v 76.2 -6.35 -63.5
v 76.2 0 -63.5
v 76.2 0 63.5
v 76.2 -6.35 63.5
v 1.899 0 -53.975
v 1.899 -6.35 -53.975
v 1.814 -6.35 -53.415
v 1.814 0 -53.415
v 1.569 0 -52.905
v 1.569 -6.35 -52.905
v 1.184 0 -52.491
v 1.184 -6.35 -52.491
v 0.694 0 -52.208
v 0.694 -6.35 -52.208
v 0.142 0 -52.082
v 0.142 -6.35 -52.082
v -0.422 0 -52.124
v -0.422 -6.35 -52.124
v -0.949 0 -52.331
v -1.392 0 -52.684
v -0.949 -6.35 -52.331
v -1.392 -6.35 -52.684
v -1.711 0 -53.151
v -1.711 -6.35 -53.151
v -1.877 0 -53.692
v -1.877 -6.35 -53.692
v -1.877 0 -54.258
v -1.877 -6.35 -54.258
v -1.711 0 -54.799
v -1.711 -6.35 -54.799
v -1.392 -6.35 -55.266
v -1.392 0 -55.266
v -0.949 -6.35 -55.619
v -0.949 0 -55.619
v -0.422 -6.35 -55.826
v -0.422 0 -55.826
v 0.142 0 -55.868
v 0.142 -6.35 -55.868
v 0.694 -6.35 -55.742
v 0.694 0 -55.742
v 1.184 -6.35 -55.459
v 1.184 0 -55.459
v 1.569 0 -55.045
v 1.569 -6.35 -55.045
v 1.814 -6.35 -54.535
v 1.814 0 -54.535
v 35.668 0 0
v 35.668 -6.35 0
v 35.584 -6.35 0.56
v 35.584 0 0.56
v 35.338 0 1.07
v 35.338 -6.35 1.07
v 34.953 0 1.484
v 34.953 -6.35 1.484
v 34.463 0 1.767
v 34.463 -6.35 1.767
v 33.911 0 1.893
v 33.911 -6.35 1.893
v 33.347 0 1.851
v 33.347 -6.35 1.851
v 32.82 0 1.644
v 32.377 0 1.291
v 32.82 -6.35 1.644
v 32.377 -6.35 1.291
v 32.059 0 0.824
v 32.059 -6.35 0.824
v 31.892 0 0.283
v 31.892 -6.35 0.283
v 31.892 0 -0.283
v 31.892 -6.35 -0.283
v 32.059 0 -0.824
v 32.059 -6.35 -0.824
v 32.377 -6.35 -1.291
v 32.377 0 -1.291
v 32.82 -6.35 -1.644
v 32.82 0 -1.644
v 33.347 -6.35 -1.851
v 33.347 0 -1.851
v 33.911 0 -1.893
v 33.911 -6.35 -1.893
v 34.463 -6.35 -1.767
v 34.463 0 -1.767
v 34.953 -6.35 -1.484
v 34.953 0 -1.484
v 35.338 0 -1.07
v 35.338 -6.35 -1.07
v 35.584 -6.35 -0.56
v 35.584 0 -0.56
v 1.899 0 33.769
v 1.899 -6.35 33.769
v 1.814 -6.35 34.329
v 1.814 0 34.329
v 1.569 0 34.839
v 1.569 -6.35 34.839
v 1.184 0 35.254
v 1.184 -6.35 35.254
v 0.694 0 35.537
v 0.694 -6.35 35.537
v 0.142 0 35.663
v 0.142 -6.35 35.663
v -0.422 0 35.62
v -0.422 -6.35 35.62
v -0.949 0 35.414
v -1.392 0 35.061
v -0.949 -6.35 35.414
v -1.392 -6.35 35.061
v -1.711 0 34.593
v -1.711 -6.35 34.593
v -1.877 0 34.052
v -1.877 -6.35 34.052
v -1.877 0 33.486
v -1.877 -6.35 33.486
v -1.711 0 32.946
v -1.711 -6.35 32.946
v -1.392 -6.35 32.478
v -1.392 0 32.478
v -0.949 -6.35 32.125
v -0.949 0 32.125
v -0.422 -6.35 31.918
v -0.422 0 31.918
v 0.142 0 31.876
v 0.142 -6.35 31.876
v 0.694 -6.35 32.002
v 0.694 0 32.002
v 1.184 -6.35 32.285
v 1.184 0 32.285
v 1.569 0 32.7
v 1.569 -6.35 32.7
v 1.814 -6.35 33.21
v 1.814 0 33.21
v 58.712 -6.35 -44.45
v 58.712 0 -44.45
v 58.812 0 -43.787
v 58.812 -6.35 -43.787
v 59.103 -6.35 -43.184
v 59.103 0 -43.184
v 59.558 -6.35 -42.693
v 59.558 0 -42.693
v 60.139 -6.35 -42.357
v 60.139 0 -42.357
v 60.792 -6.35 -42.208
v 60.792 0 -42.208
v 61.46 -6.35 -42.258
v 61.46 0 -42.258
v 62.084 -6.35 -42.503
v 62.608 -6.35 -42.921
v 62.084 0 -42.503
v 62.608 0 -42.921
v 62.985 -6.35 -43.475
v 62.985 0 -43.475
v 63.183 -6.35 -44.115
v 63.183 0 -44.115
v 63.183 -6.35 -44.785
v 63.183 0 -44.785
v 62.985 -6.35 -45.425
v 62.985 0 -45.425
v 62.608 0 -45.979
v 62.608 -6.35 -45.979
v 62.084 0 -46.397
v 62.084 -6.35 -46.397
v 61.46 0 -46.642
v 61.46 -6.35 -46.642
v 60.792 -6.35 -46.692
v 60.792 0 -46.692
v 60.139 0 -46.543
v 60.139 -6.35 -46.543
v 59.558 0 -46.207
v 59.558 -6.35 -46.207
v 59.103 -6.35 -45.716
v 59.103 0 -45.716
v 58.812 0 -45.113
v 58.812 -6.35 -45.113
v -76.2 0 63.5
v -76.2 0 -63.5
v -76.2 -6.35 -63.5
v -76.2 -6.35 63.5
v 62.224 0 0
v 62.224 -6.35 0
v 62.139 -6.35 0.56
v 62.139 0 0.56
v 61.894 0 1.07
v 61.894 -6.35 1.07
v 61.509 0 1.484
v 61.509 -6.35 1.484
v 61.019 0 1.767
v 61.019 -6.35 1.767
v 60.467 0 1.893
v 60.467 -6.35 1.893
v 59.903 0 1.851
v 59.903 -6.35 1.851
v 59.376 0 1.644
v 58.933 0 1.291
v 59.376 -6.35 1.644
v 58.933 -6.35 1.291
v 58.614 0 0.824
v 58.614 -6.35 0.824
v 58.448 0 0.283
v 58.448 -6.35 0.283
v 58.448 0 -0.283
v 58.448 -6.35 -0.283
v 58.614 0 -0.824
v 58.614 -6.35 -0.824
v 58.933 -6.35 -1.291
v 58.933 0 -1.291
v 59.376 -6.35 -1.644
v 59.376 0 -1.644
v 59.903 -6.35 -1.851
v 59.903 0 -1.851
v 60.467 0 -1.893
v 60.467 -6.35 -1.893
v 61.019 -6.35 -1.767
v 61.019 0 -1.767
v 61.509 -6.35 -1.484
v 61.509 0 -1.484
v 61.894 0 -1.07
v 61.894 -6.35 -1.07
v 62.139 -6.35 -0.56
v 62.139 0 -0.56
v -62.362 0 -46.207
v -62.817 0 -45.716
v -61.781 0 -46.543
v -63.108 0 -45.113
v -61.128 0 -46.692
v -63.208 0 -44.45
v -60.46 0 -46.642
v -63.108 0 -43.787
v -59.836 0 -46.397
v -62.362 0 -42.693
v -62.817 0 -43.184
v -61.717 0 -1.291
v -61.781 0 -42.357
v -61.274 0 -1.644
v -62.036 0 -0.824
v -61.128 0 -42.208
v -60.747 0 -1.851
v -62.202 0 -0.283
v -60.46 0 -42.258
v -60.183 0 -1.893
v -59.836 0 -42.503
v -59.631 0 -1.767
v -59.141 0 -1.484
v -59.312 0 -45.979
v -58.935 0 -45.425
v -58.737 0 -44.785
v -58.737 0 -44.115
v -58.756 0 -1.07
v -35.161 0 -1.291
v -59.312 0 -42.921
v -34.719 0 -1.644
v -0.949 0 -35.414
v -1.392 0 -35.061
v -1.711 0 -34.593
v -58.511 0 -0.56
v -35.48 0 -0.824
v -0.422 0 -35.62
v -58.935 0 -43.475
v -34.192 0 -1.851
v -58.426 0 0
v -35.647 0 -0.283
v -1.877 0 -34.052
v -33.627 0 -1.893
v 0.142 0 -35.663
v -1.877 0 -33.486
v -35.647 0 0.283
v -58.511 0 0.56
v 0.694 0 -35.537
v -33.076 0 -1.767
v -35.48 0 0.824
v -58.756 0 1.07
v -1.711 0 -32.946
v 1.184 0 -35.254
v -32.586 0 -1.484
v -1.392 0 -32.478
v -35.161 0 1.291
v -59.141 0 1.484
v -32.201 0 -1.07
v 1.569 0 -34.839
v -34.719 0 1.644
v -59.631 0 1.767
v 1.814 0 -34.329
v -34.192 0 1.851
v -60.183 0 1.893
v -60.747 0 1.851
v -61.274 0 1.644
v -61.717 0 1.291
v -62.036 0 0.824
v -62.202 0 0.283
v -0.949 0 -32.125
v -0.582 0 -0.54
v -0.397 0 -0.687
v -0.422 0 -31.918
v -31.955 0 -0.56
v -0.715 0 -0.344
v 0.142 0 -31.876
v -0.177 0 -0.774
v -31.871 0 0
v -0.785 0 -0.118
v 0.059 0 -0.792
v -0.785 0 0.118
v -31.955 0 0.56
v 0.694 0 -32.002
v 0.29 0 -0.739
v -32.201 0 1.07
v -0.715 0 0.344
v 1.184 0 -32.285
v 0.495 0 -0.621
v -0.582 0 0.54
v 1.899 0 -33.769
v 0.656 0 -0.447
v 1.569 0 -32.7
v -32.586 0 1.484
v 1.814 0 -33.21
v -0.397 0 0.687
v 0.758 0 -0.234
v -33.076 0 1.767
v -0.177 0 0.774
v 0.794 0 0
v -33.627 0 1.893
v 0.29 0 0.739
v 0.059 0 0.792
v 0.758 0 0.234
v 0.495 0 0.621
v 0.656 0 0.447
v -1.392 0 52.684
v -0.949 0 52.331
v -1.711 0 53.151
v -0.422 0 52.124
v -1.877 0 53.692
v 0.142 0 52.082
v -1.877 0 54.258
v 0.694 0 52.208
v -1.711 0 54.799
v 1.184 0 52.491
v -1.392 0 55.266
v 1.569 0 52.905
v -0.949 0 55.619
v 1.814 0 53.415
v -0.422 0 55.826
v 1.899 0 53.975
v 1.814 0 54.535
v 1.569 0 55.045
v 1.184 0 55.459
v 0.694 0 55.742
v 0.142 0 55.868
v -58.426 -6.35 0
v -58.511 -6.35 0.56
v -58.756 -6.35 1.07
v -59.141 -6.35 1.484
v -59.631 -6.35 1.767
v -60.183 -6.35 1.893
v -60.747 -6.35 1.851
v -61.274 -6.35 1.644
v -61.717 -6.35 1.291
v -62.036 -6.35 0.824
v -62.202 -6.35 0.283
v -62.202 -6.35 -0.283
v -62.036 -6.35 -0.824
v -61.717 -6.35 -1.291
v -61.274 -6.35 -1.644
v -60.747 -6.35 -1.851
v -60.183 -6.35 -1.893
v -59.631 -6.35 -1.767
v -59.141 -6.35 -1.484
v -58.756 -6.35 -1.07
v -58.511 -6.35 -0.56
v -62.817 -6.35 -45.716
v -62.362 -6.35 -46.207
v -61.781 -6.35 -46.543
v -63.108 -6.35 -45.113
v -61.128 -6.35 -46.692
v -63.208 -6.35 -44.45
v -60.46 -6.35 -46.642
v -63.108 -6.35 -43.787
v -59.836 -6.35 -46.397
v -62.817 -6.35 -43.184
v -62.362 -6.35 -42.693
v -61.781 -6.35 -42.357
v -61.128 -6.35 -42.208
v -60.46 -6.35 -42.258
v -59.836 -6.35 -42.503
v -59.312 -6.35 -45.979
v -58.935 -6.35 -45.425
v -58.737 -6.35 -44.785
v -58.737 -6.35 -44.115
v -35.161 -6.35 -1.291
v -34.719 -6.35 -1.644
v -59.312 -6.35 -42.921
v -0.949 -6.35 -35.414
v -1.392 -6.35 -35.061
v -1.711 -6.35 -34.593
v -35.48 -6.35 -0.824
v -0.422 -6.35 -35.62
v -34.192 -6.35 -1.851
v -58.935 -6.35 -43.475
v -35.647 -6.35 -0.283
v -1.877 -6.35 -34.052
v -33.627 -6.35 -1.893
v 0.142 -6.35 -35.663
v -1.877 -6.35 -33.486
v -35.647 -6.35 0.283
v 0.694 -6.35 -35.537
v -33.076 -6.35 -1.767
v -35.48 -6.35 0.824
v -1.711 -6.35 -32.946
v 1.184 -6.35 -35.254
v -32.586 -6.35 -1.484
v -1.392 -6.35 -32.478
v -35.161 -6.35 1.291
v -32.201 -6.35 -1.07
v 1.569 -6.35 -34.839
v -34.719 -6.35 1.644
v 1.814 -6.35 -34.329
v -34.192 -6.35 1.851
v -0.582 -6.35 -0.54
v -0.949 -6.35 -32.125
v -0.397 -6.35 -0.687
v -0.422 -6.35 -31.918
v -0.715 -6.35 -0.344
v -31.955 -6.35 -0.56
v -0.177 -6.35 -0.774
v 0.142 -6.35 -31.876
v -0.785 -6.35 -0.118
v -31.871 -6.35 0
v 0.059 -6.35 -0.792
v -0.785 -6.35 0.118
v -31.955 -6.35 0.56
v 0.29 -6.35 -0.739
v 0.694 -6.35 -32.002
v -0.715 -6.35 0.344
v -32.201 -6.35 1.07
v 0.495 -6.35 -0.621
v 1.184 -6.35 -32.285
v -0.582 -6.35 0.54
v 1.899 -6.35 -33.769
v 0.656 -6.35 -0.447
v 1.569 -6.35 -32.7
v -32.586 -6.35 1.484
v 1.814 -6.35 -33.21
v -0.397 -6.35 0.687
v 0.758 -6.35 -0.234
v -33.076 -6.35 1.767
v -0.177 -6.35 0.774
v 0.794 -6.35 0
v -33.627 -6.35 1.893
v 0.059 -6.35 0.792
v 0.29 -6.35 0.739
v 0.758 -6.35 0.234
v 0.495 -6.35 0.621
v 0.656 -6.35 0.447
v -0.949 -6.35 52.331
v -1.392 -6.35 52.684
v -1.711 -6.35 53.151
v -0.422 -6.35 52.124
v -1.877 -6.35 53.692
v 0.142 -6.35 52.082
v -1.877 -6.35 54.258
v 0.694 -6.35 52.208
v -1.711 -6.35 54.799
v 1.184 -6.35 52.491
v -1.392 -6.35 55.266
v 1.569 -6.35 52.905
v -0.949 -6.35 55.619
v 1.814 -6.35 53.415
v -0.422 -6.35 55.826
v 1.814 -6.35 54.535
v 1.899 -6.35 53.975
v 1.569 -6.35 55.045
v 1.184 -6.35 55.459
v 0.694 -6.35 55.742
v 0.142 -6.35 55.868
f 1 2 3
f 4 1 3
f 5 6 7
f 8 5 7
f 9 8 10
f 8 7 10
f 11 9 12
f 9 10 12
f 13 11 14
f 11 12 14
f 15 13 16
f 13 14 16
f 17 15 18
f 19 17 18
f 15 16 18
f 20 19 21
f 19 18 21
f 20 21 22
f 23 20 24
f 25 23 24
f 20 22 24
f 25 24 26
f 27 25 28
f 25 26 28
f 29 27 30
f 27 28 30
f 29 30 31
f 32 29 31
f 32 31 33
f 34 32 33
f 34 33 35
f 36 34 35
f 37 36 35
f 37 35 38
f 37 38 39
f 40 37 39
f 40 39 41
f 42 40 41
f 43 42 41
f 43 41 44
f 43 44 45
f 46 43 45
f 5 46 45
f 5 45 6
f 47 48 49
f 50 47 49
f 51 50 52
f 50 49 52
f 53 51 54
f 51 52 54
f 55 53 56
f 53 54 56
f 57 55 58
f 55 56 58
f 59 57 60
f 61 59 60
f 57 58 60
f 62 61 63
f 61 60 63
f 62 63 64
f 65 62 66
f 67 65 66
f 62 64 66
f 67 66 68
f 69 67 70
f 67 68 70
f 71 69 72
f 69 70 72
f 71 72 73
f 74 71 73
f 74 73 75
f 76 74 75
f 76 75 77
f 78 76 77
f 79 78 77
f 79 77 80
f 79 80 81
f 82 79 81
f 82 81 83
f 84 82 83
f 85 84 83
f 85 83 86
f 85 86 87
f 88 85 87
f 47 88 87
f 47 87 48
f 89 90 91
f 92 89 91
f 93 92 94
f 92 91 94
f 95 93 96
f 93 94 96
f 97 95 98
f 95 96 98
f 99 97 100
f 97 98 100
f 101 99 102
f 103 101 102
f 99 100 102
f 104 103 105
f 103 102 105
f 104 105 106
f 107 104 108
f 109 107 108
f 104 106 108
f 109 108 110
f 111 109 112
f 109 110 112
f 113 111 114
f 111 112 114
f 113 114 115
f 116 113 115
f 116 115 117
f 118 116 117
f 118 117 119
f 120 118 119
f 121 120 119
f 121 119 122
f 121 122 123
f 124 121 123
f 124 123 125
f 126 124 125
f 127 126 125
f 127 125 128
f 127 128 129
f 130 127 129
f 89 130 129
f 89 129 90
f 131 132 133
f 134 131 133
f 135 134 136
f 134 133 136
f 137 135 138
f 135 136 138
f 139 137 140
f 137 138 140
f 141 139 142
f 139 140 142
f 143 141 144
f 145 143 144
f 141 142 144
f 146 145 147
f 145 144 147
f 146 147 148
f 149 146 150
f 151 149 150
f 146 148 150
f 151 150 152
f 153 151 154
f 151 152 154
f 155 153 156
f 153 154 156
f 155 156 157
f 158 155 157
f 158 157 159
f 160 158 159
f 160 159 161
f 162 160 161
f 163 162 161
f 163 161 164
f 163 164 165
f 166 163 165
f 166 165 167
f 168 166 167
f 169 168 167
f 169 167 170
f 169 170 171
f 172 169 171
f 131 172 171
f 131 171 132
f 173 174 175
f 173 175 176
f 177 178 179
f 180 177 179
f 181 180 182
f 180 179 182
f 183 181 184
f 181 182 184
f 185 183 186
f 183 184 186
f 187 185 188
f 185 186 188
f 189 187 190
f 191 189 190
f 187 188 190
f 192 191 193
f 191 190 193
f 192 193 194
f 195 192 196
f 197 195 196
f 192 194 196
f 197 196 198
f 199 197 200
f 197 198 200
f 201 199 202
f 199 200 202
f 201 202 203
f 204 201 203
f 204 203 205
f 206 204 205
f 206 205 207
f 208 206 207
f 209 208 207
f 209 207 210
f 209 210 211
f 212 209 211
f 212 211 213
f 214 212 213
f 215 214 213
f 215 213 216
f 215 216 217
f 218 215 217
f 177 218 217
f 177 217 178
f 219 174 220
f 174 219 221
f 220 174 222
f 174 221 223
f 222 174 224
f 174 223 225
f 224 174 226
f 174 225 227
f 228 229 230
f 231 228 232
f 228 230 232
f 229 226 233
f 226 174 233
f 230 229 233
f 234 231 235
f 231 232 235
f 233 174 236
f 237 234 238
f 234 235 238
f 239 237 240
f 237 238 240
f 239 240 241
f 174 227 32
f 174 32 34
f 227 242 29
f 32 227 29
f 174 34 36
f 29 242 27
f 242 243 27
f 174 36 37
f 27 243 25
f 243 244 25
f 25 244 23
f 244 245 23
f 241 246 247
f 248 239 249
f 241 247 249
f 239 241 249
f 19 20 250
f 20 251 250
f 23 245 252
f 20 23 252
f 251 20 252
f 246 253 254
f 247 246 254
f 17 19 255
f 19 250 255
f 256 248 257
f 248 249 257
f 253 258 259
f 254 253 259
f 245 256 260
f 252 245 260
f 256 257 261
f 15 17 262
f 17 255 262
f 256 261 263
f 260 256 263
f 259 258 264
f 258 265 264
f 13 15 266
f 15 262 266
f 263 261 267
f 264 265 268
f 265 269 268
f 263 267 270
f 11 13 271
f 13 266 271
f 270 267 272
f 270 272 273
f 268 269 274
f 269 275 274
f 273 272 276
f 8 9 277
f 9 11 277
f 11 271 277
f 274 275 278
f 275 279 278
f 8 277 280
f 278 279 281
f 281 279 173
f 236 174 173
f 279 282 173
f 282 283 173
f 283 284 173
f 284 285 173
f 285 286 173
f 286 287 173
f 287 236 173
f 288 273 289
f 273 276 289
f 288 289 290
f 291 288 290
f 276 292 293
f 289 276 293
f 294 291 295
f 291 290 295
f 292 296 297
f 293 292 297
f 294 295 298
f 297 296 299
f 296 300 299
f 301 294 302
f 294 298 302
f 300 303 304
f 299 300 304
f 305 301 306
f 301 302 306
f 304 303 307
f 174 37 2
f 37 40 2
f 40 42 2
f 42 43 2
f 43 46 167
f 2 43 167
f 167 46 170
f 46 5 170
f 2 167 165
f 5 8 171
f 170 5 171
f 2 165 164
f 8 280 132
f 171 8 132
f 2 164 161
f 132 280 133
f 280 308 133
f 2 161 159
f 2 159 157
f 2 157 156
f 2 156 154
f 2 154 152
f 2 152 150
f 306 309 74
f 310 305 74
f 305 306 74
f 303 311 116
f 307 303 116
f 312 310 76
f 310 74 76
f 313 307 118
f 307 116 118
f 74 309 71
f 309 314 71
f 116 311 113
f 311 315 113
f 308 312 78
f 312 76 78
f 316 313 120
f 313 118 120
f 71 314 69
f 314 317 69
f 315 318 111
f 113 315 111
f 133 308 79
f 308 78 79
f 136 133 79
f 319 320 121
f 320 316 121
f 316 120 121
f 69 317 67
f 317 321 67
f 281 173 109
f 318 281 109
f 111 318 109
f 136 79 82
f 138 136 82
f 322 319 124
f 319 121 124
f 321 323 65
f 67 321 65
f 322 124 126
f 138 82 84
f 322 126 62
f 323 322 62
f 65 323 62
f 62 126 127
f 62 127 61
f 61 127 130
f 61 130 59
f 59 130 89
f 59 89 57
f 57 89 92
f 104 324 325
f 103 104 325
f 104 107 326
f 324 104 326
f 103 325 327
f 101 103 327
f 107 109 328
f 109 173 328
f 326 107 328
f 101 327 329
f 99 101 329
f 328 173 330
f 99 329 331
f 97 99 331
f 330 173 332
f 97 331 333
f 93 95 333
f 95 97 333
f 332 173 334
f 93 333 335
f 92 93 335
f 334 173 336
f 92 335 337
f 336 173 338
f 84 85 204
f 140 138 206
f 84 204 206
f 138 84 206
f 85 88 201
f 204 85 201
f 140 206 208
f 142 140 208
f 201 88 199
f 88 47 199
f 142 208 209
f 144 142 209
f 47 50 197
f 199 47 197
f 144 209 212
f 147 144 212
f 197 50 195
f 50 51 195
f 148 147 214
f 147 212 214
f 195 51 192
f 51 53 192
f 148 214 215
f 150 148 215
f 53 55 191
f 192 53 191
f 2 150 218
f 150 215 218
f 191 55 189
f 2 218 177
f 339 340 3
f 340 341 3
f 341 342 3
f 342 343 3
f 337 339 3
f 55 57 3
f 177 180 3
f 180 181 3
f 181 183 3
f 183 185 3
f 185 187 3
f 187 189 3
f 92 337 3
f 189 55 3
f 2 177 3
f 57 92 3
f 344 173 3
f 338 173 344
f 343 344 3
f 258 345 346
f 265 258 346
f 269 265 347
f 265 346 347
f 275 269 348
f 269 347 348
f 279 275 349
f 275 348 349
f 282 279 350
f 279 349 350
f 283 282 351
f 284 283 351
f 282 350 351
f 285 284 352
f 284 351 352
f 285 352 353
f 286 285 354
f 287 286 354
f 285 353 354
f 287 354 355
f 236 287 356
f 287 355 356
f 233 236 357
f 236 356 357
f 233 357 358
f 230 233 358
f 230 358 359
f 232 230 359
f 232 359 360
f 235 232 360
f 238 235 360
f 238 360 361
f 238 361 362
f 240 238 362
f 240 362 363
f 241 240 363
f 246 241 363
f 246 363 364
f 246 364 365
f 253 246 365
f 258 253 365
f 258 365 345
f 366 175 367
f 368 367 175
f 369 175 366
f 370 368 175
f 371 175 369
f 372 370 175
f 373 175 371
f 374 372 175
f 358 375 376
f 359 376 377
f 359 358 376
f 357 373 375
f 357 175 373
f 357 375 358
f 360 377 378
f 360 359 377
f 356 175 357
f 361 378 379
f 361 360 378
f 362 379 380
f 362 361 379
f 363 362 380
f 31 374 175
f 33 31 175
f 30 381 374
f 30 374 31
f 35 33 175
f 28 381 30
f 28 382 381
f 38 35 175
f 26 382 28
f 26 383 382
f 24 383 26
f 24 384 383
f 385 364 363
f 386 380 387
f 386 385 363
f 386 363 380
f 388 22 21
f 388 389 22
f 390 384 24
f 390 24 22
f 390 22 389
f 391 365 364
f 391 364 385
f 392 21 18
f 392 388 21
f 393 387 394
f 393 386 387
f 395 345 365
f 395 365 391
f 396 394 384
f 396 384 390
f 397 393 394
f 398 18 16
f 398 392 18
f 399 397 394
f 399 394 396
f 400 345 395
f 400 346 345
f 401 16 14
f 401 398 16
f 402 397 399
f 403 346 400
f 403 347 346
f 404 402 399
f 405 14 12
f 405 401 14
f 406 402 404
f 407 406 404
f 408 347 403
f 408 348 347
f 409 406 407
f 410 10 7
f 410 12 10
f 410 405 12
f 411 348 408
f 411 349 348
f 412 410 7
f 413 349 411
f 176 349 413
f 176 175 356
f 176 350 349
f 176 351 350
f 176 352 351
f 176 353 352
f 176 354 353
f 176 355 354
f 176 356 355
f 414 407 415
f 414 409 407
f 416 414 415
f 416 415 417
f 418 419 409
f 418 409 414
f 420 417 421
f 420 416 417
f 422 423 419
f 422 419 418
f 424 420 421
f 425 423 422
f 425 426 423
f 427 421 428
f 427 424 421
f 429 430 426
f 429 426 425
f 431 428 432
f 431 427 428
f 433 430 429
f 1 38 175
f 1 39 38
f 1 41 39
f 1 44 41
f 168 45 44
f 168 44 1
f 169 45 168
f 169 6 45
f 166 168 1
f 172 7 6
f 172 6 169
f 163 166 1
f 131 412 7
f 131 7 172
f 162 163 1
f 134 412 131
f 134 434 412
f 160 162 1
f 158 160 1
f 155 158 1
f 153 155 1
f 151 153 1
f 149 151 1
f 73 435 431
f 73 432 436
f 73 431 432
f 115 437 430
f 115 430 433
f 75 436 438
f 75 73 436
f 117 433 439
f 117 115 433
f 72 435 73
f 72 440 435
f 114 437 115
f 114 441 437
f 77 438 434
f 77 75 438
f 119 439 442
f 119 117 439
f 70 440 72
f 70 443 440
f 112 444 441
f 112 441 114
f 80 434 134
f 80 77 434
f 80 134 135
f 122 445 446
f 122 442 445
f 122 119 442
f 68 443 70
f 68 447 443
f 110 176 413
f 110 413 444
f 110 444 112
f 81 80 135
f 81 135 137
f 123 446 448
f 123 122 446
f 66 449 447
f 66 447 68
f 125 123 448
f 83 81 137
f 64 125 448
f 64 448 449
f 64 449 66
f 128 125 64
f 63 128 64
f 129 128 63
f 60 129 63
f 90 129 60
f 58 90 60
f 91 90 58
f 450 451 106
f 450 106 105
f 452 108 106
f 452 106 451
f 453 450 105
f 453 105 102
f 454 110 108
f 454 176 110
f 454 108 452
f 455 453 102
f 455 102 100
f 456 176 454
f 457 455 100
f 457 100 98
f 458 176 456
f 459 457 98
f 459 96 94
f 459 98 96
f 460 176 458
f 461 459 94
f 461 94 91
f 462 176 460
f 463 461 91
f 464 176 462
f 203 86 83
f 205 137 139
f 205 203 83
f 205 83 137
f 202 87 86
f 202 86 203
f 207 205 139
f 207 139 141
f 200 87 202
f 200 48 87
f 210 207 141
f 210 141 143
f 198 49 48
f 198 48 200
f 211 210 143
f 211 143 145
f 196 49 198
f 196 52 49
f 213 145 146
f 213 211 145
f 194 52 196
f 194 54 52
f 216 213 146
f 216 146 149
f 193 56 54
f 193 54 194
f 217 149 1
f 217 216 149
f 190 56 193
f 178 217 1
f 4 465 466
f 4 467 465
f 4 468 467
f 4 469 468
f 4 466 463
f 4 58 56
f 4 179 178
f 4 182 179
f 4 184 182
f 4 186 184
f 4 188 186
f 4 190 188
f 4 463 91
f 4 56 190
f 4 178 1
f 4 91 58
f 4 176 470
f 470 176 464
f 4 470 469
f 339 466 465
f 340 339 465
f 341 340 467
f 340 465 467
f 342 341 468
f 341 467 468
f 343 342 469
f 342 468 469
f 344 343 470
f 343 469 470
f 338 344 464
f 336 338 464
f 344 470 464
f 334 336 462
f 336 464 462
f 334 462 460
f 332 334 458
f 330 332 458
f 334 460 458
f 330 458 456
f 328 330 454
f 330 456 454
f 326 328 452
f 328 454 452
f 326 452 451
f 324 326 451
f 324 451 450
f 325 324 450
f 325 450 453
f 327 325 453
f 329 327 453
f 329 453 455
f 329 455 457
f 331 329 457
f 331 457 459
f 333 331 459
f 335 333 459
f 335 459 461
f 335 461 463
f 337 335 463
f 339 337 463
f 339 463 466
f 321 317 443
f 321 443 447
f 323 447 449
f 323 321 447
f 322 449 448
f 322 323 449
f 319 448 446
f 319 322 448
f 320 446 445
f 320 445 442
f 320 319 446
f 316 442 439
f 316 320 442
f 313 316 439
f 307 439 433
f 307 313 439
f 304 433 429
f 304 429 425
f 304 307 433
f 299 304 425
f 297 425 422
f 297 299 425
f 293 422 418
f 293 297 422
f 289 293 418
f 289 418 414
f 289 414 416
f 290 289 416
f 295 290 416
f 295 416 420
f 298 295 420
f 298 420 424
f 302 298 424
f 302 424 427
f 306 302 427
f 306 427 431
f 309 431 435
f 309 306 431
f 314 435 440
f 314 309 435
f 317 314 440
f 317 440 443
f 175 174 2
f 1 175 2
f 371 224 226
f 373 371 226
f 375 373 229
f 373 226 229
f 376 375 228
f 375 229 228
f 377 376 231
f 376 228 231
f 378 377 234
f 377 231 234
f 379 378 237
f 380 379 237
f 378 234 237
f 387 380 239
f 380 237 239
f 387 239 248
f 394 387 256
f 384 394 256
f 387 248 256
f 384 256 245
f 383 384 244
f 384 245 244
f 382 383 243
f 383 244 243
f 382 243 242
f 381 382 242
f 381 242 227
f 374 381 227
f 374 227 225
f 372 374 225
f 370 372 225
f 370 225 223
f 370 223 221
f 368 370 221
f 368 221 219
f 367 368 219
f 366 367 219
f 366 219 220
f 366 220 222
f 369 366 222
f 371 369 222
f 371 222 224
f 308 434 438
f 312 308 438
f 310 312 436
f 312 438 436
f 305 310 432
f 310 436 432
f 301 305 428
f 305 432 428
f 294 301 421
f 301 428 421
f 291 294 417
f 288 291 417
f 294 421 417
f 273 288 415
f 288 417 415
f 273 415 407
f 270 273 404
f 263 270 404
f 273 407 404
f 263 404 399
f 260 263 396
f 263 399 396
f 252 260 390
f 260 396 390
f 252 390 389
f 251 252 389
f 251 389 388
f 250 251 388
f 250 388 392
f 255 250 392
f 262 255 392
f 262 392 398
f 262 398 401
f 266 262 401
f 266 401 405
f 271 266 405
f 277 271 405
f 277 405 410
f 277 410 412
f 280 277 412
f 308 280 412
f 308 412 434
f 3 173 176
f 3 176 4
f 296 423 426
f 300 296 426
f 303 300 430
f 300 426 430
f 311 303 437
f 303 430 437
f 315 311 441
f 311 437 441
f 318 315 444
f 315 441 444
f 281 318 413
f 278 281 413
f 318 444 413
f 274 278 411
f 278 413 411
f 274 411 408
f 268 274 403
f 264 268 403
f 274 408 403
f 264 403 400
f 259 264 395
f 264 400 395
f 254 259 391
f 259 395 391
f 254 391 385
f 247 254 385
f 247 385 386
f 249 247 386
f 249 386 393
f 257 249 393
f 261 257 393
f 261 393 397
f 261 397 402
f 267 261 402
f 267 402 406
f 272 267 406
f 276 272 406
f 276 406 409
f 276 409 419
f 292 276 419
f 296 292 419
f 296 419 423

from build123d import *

# Parameters (mm, degrees)
F0_W     = 152.4
F0_H     = 127
F0_R     = 0.79375
F1_DEPTH = 6.35
F3_D     = 3.7973
F5_D     = 3.7973
F8_D     = 4.4958


with BuildPart() as f1:
    # F0 (on Front) → F1 (new body)
    with BuildSketch(Plane.XZ):
        Rectangle(F0_W, F0_H)
        Circle(F0_R, mode=Mode.SUBTRACT)
    extrude(amount=F1_DEPTH)

    # F3 (through all)
    with Locations(Plane(origin=(0, 0, 0), x_dir=(-1, 0, 0), z_dir=(0, 1, 0))):
        with Locations((0, 33.7693), (33.7693, 0), (-33.7693, 0), (0, -33.7693)):
            Hole(F3_D / 2)

    # F5 (through all)
    with Locations(Plane(origin=(0, 0, 0), x_dir=(-1, 0, 0), z_dir=(0, 1, 0))):
        with Locations((0, 53.975), (60.325, 0), (0, -53.975), (-60.325, 0)):
            Hole(F5_D / 2)

    # F8 (through all)
    with Locations(Plane.XZ.offset(6.35)):
        with Locations((-60.96, -44.45), (60.96, -44.45)):
            Hole(F8_D / 2)


solid = f1.part
